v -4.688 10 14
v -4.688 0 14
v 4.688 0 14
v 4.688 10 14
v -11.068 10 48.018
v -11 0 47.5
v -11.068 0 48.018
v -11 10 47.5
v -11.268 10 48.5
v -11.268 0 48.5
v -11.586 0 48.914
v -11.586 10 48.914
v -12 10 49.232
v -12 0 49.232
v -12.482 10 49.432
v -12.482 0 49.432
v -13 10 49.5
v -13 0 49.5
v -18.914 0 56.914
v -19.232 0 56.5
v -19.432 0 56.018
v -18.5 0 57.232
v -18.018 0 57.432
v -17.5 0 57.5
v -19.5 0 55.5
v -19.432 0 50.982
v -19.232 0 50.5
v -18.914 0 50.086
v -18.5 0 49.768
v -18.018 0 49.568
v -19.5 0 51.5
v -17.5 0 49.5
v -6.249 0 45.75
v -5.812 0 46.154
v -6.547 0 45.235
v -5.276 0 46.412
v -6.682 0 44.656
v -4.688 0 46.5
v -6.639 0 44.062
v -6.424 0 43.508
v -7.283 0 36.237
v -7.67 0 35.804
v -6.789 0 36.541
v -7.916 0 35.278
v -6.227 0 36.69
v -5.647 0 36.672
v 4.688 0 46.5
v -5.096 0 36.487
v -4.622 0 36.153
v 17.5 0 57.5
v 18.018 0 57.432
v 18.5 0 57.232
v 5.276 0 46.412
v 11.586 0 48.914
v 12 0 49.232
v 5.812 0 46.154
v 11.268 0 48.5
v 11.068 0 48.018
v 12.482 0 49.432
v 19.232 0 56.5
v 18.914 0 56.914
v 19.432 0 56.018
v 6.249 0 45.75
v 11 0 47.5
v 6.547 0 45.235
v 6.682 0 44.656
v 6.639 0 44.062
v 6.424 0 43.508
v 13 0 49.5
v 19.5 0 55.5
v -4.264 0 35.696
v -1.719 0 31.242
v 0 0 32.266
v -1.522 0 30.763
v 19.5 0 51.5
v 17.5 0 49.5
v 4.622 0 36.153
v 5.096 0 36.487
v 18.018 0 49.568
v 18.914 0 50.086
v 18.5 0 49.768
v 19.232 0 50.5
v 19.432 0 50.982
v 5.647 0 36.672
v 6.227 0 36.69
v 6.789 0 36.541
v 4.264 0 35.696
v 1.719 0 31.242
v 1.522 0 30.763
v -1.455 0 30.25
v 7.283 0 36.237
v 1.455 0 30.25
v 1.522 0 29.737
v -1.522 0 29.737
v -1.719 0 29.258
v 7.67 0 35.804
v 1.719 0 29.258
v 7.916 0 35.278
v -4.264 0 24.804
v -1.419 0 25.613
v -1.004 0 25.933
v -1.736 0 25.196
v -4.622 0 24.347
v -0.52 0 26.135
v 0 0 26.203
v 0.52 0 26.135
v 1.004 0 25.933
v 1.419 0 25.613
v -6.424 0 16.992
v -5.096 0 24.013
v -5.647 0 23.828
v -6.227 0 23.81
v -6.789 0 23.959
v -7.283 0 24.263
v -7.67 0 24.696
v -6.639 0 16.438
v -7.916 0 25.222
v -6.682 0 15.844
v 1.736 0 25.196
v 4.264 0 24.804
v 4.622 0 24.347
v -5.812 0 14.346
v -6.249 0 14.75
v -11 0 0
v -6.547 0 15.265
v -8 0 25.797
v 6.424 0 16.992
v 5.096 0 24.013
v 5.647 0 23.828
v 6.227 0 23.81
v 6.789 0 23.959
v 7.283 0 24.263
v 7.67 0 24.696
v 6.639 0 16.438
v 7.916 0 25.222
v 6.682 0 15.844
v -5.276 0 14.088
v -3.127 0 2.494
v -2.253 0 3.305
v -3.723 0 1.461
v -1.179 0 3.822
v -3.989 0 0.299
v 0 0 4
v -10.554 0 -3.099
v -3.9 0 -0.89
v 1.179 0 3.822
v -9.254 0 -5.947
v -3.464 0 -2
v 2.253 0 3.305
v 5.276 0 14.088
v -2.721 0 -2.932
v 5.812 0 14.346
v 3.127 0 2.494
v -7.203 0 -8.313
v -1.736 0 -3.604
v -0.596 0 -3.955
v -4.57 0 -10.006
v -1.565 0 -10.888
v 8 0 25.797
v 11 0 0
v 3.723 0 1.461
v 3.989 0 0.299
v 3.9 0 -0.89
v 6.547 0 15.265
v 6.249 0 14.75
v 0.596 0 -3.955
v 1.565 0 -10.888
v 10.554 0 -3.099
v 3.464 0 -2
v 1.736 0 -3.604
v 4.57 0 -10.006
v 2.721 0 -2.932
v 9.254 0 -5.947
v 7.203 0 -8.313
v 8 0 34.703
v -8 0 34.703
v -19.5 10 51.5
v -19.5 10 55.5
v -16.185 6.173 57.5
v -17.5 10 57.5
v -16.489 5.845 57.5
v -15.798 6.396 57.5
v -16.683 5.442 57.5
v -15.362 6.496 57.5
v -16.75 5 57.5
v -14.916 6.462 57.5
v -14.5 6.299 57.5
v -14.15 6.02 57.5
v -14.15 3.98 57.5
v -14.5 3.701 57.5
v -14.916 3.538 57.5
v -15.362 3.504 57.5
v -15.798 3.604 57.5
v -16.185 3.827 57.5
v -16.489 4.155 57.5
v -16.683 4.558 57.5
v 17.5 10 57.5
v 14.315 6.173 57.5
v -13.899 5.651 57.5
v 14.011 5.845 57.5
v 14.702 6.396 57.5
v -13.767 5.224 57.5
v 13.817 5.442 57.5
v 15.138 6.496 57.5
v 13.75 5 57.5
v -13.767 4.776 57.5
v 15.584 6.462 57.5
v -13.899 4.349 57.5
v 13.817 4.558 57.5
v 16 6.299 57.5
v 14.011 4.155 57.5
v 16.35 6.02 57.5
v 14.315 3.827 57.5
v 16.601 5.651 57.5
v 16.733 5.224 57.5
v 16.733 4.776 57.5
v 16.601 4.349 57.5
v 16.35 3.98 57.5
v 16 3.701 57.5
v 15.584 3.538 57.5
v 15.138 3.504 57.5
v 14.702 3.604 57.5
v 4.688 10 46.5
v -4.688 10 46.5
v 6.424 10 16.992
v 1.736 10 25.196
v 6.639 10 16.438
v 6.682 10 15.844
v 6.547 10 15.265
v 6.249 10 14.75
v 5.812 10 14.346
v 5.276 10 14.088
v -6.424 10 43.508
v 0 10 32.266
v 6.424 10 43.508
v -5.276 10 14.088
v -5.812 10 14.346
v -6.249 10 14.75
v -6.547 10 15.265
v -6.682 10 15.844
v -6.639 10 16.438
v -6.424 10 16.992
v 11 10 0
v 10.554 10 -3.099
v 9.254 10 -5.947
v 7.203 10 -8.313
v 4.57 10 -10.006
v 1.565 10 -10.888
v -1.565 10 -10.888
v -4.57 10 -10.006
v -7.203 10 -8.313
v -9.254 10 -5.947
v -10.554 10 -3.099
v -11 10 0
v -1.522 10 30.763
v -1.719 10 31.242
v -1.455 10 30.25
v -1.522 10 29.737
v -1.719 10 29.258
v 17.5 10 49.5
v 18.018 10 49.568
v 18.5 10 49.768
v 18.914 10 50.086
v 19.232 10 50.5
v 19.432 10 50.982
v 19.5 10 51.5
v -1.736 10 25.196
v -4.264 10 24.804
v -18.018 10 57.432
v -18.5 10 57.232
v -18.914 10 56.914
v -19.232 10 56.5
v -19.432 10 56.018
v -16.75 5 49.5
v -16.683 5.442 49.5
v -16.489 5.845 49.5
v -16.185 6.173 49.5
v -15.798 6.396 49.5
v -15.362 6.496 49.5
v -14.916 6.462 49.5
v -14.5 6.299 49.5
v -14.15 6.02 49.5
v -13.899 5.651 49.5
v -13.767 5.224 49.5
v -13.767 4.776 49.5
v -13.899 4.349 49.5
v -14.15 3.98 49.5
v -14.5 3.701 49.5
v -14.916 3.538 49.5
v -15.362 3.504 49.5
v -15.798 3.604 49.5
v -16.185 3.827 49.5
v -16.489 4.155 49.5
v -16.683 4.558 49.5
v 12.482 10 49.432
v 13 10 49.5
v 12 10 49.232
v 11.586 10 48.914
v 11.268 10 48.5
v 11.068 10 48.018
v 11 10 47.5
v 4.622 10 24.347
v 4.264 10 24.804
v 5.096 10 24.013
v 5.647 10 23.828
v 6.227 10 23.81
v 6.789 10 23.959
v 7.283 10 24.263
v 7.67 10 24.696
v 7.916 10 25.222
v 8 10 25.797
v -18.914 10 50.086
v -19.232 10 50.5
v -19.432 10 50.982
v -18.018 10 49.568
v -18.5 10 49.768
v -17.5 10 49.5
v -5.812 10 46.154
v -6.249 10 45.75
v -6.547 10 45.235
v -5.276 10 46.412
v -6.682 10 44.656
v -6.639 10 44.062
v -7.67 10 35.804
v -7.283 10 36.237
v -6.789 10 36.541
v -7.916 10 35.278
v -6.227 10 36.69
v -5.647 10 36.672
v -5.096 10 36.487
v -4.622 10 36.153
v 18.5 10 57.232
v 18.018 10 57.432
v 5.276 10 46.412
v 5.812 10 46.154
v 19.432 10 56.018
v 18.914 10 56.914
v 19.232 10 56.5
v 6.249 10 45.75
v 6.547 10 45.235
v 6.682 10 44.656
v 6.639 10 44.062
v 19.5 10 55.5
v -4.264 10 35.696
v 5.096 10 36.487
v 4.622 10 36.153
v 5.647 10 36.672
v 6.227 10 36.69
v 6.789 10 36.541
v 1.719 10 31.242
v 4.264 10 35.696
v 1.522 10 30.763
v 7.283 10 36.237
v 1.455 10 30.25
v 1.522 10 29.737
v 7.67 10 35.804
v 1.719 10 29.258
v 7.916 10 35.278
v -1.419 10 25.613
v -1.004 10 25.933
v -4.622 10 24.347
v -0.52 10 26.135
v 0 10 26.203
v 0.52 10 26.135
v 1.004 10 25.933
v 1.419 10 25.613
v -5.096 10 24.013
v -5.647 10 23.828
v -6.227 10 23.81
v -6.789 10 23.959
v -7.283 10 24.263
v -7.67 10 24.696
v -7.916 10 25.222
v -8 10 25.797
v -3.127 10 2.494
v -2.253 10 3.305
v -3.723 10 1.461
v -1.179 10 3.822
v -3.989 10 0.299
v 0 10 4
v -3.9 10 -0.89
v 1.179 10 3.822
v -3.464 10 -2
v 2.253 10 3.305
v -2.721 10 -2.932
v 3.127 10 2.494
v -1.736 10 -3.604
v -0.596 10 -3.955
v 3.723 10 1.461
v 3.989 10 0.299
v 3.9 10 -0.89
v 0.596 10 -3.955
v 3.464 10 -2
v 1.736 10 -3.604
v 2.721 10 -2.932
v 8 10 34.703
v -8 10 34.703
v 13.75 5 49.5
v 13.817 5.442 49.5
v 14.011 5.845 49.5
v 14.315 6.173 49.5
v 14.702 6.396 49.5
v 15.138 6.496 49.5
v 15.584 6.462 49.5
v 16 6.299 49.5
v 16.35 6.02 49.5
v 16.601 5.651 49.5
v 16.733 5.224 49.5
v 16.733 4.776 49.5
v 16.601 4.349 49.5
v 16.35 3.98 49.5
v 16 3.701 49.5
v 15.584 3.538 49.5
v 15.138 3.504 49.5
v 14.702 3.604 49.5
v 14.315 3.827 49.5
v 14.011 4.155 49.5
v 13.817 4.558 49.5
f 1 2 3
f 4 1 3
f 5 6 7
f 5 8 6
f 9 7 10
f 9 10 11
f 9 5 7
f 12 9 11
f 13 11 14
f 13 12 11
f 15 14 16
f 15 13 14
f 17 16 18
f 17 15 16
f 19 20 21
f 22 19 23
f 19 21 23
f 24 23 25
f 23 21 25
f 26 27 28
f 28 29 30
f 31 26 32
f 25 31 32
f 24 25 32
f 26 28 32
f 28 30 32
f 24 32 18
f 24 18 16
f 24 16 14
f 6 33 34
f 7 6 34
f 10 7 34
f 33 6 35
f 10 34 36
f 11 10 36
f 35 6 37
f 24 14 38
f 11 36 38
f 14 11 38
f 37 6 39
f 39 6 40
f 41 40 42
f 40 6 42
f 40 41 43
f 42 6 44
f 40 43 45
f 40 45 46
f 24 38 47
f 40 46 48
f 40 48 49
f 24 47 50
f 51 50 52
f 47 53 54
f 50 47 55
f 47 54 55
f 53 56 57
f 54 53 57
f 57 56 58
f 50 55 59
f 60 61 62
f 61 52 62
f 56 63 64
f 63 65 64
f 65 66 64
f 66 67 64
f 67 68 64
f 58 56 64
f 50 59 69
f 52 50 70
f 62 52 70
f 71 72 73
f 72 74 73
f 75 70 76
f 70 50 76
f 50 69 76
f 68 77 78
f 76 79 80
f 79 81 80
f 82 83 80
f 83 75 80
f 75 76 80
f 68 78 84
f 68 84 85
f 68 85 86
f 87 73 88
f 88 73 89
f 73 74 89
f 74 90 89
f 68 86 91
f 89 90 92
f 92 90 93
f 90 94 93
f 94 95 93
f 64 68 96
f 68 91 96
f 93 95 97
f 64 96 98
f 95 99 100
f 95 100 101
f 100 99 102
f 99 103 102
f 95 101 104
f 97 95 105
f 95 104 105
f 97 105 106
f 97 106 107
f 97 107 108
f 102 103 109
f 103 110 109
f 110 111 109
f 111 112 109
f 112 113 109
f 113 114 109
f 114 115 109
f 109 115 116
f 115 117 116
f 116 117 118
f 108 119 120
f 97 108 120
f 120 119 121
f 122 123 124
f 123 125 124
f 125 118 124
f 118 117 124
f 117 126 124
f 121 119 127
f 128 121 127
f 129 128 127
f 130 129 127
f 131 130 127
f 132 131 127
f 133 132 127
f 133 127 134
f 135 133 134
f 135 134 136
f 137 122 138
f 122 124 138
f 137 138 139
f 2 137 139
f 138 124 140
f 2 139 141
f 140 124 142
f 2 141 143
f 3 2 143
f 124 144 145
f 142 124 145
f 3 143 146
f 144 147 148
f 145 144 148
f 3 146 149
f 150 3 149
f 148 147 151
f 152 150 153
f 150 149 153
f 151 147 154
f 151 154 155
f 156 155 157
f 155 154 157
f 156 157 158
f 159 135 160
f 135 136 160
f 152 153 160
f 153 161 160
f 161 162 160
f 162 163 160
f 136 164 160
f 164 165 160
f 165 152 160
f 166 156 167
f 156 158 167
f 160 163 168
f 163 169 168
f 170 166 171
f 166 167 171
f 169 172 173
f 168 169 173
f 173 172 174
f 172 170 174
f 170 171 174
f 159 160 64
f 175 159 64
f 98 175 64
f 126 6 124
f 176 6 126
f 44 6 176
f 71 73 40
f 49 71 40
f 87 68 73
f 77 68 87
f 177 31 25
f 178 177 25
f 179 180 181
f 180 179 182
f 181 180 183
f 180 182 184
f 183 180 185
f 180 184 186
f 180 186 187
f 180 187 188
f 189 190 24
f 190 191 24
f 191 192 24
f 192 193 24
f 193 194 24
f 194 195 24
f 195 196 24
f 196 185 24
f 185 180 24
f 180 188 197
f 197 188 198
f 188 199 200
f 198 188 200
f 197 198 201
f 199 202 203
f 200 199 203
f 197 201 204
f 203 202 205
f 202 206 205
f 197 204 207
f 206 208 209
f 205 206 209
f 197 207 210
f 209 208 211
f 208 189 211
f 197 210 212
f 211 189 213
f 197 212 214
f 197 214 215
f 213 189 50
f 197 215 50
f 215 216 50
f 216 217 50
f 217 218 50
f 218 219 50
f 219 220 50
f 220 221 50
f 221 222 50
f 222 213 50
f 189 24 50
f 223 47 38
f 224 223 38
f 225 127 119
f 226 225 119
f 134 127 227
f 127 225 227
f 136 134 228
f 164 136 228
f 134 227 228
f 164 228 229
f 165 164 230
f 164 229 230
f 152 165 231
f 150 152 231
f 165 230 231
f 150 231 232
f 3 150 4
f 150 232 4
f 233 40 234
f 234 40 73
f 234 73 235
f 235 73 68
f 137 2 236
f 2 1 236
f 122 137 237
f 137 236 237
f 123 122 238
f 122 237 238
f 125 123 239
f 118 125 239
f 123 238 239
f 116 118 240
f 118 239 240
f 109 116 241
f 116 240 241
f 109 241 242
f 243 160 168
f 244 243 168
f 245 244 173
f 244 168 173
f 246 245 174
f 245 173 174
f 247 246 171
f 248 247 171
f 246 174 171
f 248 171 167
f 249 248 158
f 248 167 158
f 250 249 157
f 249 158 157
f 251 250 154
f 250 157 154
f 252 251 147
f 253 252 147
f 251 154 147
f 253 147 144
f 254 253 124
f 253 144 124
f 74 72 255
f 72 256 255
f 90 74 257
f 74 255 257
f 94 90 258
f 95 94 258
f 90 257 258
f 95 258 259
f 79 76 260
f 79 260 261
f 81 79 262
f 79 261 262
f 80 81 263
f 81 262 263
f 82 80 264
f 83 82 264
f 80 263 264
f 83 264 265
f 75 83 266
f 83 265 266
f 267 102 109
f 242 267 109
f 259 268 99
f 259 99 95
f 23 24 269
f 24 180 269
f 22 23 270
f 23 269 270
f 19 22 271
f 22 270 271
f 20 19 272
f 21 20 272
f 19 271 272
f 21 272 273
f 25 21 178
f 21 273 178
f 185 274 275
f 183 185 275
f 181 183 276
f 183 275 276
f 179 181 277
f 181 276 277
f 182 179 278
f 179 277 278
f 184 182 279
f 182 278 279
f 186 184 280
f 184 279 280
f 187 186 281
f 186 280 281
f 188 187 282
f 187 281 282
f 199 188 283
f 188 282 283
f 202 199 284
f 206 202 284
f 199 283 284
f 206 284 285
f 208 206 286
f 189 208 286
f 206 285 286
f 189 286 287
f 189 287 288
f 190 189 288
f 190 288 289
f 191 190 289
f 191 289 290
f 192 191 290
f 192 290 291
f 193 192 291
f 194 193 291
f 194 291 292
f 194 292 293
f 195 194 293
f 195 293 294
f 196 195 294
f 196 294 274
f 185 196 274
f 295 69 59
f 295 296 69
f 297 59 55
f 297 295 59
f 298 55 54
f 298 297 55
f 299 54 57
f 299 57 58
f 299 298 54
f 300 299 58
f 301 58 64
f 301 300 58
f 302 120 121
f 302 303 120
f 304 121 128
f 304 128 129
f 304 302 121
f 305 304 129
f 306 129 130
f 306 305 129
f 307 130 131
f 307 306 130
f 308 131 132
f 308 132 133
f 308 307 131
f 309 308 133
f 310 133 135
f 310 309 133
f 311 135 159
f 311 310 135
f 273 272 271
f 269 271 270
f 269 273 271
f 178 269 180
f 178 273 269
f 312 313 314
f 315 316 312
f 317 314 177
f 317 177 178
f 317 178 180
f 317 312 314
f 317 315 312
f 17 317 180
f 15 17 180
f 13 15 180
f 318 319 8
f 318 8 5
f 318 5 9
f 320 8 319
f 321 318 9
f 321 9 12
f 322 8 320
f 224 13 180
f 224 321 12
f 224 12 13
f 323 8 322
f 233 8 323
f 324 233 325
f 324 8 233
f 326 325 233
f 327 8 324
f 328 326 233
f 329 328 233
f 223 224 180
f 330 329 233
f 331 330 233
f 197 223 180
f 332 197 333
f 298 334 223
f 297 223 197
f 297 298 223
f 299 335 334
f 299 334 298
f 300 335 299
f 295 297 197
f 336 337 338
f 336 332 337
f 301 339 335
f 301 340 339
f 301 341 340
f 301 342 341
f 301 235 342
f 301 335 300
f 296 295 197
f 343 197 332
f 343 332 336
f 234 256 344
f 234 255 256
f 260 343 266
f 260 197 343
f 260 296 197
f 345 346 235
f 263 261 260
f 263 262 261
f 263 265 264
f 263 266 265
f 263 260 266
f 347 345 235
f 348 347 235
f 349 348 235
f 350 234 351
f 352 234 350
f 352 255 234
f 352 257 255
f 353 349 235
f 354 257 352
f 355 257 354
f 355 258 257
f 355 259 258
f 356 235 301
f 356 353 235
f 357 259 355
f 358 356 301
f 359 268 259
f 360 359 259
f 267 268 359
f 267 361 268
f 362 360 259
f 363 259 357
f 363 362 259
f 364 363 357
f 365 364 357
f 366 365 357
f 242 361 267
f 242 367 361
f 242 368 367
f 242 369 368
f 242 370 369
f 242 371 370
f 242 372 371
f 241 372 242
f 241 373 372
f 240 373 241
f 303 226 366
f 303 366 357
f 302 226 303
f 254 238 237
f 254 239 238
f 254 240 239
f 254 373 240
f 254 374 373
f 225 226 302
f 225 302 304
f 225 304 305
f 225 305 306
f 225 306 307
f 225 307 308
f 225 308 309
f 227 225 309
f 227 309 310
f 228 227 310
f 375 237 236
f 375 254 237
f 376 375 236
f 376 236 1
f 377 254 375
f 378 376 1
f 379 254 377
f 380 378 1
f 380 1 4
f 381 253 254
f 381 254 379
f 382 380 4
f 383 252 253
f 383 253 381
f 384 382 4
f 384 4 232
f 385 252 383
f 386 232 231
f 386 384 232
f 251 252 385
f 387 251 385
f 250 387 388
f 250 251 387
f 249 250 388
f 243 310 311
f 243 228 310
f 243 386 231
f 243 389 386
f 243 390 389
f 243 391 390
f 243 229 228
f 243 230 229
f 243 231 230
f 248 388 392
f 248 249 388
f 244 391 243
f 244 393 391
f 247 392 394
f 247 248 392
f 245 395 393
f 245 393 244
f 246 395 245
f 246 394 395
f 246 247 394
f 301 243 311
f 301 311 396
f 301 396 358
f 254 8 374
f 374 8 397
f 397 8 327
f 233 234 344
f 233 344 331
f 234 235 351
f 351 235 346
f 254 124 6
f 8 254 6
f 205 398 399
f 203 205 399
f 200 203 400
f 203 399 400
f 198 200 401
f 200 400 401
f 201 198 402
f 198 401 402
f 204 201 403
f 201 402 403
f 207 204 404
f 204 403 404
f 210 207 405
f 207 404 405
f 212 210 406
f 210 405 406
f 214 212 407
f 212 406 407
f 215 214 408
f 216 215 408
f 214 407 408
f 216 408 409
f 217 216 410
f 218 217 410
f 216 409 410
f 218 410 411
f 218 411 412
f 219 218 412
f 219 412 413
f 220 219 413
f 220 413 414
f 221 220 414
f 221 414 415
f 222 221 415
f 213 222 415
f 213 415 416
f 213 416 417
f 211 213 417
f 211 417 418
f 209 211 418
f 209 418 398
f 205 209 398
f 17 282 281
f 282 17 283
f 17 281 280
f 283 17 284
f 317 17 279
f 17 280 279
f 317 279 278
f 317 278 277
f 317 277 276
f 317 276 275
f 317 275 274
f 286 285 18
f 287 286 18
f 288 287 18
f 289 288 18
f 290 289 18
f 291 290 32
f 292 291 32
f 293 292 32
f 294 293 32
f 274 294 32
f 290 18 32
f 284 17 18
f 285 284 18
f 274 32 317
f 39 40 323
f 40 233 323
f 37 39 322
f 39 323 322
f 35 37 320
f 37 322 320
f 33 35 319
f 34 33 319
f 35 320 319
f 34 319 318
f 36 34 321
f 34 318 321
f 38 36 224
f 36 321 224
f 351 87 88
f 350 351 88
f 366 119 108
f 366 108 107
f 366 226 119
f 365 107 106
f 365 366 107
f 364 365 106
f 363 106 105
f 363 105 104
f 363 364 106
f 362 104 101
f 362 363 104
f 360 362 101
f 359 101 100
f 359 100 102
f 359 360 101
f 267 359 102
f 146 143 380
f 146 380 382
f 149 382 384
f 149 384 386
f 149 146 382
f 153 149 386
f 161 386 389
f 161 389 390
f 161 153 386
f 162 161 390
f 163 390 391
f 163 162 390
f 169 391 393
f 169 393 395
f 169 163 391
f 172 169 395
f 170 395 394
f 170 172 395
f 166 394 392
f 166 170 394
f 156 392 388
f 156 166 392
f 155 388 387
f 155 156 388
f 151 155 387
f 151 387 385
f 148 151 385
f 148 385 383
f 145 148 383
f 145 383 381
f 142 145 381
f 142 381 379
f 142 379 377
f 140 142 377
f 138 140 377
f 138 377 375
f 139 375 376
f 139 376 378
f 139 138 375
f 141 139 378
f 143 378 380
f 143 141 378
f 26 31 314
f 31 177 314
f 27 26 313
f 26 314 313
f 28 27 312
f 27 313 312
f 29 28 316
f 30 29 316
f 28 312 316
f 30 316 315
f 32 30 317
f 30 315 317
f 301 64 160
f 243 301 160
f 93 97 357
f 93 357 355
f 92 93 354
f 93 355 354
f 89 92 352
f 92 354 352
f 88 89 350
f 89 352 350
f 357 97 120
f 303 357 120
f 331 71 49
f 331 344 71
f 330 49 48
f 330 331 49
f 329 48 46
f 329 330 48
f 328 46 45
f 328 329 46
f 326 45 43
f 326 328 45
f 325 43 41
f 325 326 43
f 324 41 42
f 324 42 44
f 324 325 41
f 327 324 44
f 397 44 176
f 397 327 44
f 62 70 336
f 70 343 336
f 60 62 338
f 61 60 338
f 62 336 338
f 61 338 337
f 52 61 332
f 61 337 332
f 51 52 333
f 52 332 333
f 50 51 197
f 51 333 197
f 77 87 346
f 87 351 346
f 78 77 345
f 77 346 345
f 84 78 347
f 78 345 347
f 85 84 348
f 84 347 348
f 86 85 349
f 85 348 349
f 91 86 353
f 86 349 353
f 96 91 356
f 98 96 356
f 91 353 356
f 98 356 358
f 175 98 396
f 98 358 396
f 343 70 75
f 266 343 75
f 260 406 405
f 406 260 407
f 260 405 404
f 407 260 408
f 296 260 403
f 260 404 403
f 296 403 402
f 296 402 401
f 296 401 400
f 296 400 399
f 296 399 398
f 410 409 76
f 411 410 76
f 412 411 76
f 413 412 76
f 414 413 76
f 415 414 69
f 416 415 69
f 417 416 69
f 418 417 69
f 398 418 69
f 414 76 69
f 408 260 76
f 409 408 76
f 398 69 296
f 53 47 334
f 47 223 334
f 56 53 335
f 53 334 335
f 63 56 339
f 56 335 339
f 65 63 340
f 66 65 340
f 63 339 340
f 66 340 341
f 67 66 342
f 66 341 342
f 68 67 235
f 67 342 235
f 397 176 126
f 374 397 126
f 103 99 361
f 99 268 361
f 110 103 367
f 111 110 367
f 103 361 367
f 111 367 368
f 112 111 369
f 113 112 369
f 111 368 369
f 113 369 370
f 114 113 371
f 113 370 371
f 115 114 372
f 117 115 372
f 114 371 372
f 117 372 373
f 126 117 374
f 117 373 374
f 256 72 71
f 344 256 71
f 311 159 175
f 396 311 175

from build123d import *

# Parameters (mm, degrees)
SKETCH1_R           = 4
BOSS_EXTRUDE1_DEPTH = 10
FILLET1_R           = 2
SKETCH2_R           = 1.5
CUT_EXTRUDE1_DEPTH  = 65.346717088


with BuildPart() as part:
    # Sketch1 → Boss-Extrude1 (new body)
    with BuildSketch(Plane(origin=(0, 0, 0), x_dir=(1, 0, 0), z_dir=(0, 1, 0))):
        with BuildLine():
            Line((19.5, -49.5), (11, -49.5))
            Line((11, -49.5), (11, 0))
            ThreePointArc((11, 0), (0, 11), (-11, 0))
            Line((-11, 0), (-11, -49.5))
            Line((-11, -49.5), (-19.5, -49.5))
            Line((-19.5, -49.5), (-19.5, -57.5))
            Line((-19.5, -57.5), (19.5, -57.5))
            Line((19.5, -57.5), (19.5, -49.5))
        make_face()
        Polygon((0, -32.265564437), (8.133963179, -46.5), (-8.133963179, -46.5), align=None, mode=Mode.SUBTRACT)
        Polygon((-8, -42.234435563), (-8, -18.265564437), (-1.151751107, -30.25), align=None, mode=Mode.SUBTRACT)
        Polygon((8, -18.265564437), (8, -42.234435563), (1.151751107, -30.25), align=None, mode=Mode.SUBTRACT)
        Polygon((0, -28.234435563), (-8.133963179, -14), (8.133963179, -14), align=None, mode=Mode.SUBTRACT)
        with Locations(Location((0, 0, 0), (0, 0, 270))):
            Circle(SKETCH1_R, mode=Mode.SUBTRACT)
    extrude(amount=BOSS_EXTRUDE1_DEPTH)

    # Fillet1
    fillet1_edges = [part.edges().sort_by_distance(p)[0] for p in [
        (8.133963179, 5, 14),
        (-8.133963179, 5, 14),
        (0, 5, 28.234435563),
        (8, 5, 18.265564437),
        (1.151751107, 5, 30.25),
        (8, 5, 42.234435563),
        (-1.151751107, 5, 30.25),
        (-8, 5, 18.265564437),
        (-8, 5, 42.234435563),
        (8.133963179, 5, 46.5),
        (-8.133963179, 5, 46.5),
        (11, 5, 49.5),
        (19.5, 5, 49.5),
        (19.5, 5, 57.5),
        (-19.5, 5, 57.5),
        (-19.5, 5, 49.5),
        (-11, 5, 49.5),
    ]]
    fillet(fillet1_edges, radius=FILLET1_R)

    # Sketch2 → Cut-Extrude1 (cut, through all)
    with BuildSketch(Plane(origin=(0, 0, 49.5), x_dir=(-1, 0, 0), z_dir=(0, 0, -1))):
        with Locations((-15.25, 5)):
            Circle(SKETCH2_R)
        with Locations((15.25, 5)):
            Circle(SKETCH2_R)
    extrude(amount=-CUT_EXTRUDE1_DEPTH, mode=Mode.SUBTRACT)


solid = part.part
